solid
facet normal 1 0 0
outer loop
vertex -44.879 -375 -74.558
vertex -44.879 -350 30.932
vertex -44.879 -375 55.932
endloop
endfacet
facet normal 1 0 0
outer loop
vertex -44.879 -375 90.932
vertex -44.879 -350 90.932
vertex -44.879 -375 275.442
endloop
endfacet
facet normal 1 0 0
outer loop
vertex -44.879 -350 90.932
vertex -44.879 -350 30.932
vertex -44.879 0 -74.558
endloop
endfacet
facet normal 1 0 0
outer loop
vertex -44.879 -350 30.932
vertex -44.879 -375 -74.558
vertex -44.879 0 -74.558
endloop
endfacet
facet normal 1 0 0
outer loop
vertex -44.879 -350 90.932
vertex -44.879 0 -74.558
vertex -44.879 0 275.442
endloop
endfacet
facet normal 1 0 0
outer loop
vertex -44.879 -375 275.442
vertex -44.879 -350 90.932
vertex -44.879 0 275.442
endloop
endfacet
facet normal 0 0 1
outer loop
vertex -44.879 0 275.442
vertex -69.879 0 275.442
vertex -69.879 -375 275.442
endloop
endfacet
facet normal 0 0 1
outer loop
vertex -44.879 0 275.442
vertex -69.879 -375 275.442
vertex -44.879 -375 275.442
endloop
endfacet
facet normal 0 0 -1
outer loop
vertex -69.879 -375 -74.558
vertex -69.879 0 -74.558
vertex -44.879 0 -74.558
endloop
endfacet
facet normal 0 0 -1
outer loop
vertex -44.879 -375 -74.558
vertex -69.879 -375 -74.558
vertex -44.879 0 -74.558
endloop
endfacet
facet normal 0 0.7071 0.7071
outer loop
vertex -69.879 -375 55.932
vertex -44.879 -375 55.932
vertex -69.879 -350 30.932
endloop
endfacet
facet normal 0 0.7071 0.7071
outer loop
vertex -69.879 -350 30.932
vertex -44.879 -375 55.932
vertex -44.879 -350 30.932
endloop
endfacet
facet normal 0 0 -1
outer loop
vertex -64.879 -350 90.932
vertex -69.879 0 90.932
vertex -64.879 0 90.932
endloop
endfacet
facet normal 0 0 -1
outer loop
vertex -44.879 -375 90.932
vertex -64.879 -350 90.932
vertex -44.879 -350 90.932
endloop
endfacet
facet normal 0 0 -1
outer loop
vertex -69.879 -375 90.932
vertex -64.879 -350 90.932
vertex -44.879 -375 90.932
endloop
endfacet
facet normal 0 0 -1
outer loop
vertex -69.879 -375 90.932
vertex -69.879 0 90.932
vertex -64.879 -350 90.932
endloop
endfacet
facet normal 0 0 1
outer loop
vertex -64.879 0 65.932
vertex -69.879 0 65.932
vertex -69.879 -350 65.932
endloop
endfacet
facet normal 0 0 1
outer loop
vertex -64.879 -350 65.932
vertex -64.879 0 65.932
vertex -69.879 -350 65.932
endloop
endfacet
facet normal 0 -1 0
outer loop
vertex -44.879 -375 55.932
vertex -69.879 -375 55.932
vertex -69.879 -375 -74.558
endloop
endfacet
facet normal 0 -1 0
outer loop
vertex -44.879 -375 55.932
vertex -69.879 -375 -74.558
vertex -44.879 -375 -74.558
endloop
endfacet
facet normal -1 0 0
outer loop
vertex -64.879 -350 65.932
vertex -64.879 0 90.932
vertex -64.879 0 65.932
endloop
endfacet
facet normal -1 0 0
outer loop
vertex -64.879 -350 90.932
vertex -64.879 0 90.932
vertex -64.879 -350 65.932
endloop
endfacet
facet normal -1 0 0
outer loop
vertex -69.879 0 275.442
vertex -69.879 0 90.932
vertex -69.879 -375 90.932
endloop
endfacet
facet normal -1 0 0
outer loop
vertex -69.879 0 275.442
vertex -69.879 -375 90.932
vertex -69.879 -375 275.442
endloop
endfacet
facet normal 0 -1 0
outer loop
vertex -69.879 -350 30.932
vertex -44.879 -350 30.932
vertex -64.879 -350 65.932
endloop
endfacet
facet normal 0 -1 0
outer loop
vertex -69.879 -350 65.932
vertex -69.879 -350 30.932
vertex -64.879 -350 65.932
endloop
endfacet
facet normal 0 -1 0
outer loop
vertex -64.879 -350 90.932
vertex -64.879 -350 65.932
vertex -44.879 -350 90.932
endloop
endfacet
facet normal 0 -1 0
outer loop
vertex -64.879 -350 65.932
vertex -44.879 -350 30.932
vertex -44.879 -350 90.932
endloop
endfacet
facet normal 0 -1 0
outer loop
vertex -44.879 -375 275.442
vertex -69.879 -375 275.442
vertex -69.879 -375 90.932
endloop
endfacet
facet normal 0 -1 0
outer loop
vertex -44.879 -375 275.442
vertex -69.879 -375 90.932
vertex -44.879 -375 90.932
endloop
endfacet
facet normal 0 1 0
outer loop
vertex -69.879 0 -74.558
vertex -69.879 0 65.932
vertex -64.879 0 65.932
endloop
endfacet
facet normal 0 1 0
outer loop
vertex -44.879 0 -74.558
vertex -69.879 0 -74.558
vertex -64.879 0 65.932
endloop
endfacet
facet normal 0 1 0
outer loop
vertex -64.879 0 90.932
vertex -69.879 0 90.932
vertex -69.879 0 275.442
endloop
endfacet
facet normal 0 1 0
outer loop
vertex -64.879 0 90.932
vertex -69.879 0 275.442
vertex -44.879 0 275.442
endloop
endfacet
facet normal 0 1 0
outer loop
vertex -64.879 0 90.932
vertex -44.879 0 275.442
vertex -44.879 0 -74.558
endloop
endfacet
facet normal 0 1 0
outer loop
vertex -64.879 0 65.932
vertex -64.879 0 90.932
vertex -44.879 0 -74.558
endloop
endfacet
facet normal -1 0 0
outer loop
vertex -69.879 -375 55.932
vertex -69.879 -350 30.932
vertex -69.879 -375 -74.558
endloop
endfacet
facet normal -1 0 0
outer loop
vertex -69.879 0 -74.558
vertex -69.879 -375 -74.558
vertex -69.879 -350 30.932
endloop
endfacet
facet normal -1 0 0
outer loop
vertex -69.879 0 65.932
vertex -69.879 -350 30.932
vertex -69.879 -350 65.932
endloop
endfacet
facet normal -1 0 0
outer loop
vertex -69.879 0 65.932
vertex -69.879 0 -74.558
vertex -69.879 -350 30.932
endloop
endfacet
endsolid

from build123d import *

# Parameters (mm, degrees)
F0_W     = 25
F0_H     = 350
F1_DEPTH = 375
F3_DEPTH = 25
F4_W     = 350
F4_H     = 25
F5_DEPTH = 5


with BuildPart() as f1:
    # F0 (on Front) → F1 (new body)
    with BuildSketch(Plane.XZ):
        with Locations((-57.378992, 100.442262)):
            Rectangle(F0_W, F0_H)
    extrude(amount=F1_DEPTH)

    # F2 (on face) → F3 (cut)
    with BuildSketch(Plane.YZ.offset(-44.878992)):
        Polygon((-375, 90.931553), (-375, 55.931553), (-350, 30.931553), (-350, 90.931553), align=None)
    extrude(amount=-F3_DEPTH, mode=Mode.SUBTRACT)

    # F4 (on face) → F5 (cut)
    with BuildSketch(Plane(origin=(-69.878992, 0, 0), x_dir=(0, -1, 0), z_dir=(-1, 0, 0))):
        with Locations((175, 78.431553)):
            Rectangle(F4_W, F4_H)
    extrude(amount=-F5_DEPTH, mode=Mode.SUBTRACT)


solid = f1.part
